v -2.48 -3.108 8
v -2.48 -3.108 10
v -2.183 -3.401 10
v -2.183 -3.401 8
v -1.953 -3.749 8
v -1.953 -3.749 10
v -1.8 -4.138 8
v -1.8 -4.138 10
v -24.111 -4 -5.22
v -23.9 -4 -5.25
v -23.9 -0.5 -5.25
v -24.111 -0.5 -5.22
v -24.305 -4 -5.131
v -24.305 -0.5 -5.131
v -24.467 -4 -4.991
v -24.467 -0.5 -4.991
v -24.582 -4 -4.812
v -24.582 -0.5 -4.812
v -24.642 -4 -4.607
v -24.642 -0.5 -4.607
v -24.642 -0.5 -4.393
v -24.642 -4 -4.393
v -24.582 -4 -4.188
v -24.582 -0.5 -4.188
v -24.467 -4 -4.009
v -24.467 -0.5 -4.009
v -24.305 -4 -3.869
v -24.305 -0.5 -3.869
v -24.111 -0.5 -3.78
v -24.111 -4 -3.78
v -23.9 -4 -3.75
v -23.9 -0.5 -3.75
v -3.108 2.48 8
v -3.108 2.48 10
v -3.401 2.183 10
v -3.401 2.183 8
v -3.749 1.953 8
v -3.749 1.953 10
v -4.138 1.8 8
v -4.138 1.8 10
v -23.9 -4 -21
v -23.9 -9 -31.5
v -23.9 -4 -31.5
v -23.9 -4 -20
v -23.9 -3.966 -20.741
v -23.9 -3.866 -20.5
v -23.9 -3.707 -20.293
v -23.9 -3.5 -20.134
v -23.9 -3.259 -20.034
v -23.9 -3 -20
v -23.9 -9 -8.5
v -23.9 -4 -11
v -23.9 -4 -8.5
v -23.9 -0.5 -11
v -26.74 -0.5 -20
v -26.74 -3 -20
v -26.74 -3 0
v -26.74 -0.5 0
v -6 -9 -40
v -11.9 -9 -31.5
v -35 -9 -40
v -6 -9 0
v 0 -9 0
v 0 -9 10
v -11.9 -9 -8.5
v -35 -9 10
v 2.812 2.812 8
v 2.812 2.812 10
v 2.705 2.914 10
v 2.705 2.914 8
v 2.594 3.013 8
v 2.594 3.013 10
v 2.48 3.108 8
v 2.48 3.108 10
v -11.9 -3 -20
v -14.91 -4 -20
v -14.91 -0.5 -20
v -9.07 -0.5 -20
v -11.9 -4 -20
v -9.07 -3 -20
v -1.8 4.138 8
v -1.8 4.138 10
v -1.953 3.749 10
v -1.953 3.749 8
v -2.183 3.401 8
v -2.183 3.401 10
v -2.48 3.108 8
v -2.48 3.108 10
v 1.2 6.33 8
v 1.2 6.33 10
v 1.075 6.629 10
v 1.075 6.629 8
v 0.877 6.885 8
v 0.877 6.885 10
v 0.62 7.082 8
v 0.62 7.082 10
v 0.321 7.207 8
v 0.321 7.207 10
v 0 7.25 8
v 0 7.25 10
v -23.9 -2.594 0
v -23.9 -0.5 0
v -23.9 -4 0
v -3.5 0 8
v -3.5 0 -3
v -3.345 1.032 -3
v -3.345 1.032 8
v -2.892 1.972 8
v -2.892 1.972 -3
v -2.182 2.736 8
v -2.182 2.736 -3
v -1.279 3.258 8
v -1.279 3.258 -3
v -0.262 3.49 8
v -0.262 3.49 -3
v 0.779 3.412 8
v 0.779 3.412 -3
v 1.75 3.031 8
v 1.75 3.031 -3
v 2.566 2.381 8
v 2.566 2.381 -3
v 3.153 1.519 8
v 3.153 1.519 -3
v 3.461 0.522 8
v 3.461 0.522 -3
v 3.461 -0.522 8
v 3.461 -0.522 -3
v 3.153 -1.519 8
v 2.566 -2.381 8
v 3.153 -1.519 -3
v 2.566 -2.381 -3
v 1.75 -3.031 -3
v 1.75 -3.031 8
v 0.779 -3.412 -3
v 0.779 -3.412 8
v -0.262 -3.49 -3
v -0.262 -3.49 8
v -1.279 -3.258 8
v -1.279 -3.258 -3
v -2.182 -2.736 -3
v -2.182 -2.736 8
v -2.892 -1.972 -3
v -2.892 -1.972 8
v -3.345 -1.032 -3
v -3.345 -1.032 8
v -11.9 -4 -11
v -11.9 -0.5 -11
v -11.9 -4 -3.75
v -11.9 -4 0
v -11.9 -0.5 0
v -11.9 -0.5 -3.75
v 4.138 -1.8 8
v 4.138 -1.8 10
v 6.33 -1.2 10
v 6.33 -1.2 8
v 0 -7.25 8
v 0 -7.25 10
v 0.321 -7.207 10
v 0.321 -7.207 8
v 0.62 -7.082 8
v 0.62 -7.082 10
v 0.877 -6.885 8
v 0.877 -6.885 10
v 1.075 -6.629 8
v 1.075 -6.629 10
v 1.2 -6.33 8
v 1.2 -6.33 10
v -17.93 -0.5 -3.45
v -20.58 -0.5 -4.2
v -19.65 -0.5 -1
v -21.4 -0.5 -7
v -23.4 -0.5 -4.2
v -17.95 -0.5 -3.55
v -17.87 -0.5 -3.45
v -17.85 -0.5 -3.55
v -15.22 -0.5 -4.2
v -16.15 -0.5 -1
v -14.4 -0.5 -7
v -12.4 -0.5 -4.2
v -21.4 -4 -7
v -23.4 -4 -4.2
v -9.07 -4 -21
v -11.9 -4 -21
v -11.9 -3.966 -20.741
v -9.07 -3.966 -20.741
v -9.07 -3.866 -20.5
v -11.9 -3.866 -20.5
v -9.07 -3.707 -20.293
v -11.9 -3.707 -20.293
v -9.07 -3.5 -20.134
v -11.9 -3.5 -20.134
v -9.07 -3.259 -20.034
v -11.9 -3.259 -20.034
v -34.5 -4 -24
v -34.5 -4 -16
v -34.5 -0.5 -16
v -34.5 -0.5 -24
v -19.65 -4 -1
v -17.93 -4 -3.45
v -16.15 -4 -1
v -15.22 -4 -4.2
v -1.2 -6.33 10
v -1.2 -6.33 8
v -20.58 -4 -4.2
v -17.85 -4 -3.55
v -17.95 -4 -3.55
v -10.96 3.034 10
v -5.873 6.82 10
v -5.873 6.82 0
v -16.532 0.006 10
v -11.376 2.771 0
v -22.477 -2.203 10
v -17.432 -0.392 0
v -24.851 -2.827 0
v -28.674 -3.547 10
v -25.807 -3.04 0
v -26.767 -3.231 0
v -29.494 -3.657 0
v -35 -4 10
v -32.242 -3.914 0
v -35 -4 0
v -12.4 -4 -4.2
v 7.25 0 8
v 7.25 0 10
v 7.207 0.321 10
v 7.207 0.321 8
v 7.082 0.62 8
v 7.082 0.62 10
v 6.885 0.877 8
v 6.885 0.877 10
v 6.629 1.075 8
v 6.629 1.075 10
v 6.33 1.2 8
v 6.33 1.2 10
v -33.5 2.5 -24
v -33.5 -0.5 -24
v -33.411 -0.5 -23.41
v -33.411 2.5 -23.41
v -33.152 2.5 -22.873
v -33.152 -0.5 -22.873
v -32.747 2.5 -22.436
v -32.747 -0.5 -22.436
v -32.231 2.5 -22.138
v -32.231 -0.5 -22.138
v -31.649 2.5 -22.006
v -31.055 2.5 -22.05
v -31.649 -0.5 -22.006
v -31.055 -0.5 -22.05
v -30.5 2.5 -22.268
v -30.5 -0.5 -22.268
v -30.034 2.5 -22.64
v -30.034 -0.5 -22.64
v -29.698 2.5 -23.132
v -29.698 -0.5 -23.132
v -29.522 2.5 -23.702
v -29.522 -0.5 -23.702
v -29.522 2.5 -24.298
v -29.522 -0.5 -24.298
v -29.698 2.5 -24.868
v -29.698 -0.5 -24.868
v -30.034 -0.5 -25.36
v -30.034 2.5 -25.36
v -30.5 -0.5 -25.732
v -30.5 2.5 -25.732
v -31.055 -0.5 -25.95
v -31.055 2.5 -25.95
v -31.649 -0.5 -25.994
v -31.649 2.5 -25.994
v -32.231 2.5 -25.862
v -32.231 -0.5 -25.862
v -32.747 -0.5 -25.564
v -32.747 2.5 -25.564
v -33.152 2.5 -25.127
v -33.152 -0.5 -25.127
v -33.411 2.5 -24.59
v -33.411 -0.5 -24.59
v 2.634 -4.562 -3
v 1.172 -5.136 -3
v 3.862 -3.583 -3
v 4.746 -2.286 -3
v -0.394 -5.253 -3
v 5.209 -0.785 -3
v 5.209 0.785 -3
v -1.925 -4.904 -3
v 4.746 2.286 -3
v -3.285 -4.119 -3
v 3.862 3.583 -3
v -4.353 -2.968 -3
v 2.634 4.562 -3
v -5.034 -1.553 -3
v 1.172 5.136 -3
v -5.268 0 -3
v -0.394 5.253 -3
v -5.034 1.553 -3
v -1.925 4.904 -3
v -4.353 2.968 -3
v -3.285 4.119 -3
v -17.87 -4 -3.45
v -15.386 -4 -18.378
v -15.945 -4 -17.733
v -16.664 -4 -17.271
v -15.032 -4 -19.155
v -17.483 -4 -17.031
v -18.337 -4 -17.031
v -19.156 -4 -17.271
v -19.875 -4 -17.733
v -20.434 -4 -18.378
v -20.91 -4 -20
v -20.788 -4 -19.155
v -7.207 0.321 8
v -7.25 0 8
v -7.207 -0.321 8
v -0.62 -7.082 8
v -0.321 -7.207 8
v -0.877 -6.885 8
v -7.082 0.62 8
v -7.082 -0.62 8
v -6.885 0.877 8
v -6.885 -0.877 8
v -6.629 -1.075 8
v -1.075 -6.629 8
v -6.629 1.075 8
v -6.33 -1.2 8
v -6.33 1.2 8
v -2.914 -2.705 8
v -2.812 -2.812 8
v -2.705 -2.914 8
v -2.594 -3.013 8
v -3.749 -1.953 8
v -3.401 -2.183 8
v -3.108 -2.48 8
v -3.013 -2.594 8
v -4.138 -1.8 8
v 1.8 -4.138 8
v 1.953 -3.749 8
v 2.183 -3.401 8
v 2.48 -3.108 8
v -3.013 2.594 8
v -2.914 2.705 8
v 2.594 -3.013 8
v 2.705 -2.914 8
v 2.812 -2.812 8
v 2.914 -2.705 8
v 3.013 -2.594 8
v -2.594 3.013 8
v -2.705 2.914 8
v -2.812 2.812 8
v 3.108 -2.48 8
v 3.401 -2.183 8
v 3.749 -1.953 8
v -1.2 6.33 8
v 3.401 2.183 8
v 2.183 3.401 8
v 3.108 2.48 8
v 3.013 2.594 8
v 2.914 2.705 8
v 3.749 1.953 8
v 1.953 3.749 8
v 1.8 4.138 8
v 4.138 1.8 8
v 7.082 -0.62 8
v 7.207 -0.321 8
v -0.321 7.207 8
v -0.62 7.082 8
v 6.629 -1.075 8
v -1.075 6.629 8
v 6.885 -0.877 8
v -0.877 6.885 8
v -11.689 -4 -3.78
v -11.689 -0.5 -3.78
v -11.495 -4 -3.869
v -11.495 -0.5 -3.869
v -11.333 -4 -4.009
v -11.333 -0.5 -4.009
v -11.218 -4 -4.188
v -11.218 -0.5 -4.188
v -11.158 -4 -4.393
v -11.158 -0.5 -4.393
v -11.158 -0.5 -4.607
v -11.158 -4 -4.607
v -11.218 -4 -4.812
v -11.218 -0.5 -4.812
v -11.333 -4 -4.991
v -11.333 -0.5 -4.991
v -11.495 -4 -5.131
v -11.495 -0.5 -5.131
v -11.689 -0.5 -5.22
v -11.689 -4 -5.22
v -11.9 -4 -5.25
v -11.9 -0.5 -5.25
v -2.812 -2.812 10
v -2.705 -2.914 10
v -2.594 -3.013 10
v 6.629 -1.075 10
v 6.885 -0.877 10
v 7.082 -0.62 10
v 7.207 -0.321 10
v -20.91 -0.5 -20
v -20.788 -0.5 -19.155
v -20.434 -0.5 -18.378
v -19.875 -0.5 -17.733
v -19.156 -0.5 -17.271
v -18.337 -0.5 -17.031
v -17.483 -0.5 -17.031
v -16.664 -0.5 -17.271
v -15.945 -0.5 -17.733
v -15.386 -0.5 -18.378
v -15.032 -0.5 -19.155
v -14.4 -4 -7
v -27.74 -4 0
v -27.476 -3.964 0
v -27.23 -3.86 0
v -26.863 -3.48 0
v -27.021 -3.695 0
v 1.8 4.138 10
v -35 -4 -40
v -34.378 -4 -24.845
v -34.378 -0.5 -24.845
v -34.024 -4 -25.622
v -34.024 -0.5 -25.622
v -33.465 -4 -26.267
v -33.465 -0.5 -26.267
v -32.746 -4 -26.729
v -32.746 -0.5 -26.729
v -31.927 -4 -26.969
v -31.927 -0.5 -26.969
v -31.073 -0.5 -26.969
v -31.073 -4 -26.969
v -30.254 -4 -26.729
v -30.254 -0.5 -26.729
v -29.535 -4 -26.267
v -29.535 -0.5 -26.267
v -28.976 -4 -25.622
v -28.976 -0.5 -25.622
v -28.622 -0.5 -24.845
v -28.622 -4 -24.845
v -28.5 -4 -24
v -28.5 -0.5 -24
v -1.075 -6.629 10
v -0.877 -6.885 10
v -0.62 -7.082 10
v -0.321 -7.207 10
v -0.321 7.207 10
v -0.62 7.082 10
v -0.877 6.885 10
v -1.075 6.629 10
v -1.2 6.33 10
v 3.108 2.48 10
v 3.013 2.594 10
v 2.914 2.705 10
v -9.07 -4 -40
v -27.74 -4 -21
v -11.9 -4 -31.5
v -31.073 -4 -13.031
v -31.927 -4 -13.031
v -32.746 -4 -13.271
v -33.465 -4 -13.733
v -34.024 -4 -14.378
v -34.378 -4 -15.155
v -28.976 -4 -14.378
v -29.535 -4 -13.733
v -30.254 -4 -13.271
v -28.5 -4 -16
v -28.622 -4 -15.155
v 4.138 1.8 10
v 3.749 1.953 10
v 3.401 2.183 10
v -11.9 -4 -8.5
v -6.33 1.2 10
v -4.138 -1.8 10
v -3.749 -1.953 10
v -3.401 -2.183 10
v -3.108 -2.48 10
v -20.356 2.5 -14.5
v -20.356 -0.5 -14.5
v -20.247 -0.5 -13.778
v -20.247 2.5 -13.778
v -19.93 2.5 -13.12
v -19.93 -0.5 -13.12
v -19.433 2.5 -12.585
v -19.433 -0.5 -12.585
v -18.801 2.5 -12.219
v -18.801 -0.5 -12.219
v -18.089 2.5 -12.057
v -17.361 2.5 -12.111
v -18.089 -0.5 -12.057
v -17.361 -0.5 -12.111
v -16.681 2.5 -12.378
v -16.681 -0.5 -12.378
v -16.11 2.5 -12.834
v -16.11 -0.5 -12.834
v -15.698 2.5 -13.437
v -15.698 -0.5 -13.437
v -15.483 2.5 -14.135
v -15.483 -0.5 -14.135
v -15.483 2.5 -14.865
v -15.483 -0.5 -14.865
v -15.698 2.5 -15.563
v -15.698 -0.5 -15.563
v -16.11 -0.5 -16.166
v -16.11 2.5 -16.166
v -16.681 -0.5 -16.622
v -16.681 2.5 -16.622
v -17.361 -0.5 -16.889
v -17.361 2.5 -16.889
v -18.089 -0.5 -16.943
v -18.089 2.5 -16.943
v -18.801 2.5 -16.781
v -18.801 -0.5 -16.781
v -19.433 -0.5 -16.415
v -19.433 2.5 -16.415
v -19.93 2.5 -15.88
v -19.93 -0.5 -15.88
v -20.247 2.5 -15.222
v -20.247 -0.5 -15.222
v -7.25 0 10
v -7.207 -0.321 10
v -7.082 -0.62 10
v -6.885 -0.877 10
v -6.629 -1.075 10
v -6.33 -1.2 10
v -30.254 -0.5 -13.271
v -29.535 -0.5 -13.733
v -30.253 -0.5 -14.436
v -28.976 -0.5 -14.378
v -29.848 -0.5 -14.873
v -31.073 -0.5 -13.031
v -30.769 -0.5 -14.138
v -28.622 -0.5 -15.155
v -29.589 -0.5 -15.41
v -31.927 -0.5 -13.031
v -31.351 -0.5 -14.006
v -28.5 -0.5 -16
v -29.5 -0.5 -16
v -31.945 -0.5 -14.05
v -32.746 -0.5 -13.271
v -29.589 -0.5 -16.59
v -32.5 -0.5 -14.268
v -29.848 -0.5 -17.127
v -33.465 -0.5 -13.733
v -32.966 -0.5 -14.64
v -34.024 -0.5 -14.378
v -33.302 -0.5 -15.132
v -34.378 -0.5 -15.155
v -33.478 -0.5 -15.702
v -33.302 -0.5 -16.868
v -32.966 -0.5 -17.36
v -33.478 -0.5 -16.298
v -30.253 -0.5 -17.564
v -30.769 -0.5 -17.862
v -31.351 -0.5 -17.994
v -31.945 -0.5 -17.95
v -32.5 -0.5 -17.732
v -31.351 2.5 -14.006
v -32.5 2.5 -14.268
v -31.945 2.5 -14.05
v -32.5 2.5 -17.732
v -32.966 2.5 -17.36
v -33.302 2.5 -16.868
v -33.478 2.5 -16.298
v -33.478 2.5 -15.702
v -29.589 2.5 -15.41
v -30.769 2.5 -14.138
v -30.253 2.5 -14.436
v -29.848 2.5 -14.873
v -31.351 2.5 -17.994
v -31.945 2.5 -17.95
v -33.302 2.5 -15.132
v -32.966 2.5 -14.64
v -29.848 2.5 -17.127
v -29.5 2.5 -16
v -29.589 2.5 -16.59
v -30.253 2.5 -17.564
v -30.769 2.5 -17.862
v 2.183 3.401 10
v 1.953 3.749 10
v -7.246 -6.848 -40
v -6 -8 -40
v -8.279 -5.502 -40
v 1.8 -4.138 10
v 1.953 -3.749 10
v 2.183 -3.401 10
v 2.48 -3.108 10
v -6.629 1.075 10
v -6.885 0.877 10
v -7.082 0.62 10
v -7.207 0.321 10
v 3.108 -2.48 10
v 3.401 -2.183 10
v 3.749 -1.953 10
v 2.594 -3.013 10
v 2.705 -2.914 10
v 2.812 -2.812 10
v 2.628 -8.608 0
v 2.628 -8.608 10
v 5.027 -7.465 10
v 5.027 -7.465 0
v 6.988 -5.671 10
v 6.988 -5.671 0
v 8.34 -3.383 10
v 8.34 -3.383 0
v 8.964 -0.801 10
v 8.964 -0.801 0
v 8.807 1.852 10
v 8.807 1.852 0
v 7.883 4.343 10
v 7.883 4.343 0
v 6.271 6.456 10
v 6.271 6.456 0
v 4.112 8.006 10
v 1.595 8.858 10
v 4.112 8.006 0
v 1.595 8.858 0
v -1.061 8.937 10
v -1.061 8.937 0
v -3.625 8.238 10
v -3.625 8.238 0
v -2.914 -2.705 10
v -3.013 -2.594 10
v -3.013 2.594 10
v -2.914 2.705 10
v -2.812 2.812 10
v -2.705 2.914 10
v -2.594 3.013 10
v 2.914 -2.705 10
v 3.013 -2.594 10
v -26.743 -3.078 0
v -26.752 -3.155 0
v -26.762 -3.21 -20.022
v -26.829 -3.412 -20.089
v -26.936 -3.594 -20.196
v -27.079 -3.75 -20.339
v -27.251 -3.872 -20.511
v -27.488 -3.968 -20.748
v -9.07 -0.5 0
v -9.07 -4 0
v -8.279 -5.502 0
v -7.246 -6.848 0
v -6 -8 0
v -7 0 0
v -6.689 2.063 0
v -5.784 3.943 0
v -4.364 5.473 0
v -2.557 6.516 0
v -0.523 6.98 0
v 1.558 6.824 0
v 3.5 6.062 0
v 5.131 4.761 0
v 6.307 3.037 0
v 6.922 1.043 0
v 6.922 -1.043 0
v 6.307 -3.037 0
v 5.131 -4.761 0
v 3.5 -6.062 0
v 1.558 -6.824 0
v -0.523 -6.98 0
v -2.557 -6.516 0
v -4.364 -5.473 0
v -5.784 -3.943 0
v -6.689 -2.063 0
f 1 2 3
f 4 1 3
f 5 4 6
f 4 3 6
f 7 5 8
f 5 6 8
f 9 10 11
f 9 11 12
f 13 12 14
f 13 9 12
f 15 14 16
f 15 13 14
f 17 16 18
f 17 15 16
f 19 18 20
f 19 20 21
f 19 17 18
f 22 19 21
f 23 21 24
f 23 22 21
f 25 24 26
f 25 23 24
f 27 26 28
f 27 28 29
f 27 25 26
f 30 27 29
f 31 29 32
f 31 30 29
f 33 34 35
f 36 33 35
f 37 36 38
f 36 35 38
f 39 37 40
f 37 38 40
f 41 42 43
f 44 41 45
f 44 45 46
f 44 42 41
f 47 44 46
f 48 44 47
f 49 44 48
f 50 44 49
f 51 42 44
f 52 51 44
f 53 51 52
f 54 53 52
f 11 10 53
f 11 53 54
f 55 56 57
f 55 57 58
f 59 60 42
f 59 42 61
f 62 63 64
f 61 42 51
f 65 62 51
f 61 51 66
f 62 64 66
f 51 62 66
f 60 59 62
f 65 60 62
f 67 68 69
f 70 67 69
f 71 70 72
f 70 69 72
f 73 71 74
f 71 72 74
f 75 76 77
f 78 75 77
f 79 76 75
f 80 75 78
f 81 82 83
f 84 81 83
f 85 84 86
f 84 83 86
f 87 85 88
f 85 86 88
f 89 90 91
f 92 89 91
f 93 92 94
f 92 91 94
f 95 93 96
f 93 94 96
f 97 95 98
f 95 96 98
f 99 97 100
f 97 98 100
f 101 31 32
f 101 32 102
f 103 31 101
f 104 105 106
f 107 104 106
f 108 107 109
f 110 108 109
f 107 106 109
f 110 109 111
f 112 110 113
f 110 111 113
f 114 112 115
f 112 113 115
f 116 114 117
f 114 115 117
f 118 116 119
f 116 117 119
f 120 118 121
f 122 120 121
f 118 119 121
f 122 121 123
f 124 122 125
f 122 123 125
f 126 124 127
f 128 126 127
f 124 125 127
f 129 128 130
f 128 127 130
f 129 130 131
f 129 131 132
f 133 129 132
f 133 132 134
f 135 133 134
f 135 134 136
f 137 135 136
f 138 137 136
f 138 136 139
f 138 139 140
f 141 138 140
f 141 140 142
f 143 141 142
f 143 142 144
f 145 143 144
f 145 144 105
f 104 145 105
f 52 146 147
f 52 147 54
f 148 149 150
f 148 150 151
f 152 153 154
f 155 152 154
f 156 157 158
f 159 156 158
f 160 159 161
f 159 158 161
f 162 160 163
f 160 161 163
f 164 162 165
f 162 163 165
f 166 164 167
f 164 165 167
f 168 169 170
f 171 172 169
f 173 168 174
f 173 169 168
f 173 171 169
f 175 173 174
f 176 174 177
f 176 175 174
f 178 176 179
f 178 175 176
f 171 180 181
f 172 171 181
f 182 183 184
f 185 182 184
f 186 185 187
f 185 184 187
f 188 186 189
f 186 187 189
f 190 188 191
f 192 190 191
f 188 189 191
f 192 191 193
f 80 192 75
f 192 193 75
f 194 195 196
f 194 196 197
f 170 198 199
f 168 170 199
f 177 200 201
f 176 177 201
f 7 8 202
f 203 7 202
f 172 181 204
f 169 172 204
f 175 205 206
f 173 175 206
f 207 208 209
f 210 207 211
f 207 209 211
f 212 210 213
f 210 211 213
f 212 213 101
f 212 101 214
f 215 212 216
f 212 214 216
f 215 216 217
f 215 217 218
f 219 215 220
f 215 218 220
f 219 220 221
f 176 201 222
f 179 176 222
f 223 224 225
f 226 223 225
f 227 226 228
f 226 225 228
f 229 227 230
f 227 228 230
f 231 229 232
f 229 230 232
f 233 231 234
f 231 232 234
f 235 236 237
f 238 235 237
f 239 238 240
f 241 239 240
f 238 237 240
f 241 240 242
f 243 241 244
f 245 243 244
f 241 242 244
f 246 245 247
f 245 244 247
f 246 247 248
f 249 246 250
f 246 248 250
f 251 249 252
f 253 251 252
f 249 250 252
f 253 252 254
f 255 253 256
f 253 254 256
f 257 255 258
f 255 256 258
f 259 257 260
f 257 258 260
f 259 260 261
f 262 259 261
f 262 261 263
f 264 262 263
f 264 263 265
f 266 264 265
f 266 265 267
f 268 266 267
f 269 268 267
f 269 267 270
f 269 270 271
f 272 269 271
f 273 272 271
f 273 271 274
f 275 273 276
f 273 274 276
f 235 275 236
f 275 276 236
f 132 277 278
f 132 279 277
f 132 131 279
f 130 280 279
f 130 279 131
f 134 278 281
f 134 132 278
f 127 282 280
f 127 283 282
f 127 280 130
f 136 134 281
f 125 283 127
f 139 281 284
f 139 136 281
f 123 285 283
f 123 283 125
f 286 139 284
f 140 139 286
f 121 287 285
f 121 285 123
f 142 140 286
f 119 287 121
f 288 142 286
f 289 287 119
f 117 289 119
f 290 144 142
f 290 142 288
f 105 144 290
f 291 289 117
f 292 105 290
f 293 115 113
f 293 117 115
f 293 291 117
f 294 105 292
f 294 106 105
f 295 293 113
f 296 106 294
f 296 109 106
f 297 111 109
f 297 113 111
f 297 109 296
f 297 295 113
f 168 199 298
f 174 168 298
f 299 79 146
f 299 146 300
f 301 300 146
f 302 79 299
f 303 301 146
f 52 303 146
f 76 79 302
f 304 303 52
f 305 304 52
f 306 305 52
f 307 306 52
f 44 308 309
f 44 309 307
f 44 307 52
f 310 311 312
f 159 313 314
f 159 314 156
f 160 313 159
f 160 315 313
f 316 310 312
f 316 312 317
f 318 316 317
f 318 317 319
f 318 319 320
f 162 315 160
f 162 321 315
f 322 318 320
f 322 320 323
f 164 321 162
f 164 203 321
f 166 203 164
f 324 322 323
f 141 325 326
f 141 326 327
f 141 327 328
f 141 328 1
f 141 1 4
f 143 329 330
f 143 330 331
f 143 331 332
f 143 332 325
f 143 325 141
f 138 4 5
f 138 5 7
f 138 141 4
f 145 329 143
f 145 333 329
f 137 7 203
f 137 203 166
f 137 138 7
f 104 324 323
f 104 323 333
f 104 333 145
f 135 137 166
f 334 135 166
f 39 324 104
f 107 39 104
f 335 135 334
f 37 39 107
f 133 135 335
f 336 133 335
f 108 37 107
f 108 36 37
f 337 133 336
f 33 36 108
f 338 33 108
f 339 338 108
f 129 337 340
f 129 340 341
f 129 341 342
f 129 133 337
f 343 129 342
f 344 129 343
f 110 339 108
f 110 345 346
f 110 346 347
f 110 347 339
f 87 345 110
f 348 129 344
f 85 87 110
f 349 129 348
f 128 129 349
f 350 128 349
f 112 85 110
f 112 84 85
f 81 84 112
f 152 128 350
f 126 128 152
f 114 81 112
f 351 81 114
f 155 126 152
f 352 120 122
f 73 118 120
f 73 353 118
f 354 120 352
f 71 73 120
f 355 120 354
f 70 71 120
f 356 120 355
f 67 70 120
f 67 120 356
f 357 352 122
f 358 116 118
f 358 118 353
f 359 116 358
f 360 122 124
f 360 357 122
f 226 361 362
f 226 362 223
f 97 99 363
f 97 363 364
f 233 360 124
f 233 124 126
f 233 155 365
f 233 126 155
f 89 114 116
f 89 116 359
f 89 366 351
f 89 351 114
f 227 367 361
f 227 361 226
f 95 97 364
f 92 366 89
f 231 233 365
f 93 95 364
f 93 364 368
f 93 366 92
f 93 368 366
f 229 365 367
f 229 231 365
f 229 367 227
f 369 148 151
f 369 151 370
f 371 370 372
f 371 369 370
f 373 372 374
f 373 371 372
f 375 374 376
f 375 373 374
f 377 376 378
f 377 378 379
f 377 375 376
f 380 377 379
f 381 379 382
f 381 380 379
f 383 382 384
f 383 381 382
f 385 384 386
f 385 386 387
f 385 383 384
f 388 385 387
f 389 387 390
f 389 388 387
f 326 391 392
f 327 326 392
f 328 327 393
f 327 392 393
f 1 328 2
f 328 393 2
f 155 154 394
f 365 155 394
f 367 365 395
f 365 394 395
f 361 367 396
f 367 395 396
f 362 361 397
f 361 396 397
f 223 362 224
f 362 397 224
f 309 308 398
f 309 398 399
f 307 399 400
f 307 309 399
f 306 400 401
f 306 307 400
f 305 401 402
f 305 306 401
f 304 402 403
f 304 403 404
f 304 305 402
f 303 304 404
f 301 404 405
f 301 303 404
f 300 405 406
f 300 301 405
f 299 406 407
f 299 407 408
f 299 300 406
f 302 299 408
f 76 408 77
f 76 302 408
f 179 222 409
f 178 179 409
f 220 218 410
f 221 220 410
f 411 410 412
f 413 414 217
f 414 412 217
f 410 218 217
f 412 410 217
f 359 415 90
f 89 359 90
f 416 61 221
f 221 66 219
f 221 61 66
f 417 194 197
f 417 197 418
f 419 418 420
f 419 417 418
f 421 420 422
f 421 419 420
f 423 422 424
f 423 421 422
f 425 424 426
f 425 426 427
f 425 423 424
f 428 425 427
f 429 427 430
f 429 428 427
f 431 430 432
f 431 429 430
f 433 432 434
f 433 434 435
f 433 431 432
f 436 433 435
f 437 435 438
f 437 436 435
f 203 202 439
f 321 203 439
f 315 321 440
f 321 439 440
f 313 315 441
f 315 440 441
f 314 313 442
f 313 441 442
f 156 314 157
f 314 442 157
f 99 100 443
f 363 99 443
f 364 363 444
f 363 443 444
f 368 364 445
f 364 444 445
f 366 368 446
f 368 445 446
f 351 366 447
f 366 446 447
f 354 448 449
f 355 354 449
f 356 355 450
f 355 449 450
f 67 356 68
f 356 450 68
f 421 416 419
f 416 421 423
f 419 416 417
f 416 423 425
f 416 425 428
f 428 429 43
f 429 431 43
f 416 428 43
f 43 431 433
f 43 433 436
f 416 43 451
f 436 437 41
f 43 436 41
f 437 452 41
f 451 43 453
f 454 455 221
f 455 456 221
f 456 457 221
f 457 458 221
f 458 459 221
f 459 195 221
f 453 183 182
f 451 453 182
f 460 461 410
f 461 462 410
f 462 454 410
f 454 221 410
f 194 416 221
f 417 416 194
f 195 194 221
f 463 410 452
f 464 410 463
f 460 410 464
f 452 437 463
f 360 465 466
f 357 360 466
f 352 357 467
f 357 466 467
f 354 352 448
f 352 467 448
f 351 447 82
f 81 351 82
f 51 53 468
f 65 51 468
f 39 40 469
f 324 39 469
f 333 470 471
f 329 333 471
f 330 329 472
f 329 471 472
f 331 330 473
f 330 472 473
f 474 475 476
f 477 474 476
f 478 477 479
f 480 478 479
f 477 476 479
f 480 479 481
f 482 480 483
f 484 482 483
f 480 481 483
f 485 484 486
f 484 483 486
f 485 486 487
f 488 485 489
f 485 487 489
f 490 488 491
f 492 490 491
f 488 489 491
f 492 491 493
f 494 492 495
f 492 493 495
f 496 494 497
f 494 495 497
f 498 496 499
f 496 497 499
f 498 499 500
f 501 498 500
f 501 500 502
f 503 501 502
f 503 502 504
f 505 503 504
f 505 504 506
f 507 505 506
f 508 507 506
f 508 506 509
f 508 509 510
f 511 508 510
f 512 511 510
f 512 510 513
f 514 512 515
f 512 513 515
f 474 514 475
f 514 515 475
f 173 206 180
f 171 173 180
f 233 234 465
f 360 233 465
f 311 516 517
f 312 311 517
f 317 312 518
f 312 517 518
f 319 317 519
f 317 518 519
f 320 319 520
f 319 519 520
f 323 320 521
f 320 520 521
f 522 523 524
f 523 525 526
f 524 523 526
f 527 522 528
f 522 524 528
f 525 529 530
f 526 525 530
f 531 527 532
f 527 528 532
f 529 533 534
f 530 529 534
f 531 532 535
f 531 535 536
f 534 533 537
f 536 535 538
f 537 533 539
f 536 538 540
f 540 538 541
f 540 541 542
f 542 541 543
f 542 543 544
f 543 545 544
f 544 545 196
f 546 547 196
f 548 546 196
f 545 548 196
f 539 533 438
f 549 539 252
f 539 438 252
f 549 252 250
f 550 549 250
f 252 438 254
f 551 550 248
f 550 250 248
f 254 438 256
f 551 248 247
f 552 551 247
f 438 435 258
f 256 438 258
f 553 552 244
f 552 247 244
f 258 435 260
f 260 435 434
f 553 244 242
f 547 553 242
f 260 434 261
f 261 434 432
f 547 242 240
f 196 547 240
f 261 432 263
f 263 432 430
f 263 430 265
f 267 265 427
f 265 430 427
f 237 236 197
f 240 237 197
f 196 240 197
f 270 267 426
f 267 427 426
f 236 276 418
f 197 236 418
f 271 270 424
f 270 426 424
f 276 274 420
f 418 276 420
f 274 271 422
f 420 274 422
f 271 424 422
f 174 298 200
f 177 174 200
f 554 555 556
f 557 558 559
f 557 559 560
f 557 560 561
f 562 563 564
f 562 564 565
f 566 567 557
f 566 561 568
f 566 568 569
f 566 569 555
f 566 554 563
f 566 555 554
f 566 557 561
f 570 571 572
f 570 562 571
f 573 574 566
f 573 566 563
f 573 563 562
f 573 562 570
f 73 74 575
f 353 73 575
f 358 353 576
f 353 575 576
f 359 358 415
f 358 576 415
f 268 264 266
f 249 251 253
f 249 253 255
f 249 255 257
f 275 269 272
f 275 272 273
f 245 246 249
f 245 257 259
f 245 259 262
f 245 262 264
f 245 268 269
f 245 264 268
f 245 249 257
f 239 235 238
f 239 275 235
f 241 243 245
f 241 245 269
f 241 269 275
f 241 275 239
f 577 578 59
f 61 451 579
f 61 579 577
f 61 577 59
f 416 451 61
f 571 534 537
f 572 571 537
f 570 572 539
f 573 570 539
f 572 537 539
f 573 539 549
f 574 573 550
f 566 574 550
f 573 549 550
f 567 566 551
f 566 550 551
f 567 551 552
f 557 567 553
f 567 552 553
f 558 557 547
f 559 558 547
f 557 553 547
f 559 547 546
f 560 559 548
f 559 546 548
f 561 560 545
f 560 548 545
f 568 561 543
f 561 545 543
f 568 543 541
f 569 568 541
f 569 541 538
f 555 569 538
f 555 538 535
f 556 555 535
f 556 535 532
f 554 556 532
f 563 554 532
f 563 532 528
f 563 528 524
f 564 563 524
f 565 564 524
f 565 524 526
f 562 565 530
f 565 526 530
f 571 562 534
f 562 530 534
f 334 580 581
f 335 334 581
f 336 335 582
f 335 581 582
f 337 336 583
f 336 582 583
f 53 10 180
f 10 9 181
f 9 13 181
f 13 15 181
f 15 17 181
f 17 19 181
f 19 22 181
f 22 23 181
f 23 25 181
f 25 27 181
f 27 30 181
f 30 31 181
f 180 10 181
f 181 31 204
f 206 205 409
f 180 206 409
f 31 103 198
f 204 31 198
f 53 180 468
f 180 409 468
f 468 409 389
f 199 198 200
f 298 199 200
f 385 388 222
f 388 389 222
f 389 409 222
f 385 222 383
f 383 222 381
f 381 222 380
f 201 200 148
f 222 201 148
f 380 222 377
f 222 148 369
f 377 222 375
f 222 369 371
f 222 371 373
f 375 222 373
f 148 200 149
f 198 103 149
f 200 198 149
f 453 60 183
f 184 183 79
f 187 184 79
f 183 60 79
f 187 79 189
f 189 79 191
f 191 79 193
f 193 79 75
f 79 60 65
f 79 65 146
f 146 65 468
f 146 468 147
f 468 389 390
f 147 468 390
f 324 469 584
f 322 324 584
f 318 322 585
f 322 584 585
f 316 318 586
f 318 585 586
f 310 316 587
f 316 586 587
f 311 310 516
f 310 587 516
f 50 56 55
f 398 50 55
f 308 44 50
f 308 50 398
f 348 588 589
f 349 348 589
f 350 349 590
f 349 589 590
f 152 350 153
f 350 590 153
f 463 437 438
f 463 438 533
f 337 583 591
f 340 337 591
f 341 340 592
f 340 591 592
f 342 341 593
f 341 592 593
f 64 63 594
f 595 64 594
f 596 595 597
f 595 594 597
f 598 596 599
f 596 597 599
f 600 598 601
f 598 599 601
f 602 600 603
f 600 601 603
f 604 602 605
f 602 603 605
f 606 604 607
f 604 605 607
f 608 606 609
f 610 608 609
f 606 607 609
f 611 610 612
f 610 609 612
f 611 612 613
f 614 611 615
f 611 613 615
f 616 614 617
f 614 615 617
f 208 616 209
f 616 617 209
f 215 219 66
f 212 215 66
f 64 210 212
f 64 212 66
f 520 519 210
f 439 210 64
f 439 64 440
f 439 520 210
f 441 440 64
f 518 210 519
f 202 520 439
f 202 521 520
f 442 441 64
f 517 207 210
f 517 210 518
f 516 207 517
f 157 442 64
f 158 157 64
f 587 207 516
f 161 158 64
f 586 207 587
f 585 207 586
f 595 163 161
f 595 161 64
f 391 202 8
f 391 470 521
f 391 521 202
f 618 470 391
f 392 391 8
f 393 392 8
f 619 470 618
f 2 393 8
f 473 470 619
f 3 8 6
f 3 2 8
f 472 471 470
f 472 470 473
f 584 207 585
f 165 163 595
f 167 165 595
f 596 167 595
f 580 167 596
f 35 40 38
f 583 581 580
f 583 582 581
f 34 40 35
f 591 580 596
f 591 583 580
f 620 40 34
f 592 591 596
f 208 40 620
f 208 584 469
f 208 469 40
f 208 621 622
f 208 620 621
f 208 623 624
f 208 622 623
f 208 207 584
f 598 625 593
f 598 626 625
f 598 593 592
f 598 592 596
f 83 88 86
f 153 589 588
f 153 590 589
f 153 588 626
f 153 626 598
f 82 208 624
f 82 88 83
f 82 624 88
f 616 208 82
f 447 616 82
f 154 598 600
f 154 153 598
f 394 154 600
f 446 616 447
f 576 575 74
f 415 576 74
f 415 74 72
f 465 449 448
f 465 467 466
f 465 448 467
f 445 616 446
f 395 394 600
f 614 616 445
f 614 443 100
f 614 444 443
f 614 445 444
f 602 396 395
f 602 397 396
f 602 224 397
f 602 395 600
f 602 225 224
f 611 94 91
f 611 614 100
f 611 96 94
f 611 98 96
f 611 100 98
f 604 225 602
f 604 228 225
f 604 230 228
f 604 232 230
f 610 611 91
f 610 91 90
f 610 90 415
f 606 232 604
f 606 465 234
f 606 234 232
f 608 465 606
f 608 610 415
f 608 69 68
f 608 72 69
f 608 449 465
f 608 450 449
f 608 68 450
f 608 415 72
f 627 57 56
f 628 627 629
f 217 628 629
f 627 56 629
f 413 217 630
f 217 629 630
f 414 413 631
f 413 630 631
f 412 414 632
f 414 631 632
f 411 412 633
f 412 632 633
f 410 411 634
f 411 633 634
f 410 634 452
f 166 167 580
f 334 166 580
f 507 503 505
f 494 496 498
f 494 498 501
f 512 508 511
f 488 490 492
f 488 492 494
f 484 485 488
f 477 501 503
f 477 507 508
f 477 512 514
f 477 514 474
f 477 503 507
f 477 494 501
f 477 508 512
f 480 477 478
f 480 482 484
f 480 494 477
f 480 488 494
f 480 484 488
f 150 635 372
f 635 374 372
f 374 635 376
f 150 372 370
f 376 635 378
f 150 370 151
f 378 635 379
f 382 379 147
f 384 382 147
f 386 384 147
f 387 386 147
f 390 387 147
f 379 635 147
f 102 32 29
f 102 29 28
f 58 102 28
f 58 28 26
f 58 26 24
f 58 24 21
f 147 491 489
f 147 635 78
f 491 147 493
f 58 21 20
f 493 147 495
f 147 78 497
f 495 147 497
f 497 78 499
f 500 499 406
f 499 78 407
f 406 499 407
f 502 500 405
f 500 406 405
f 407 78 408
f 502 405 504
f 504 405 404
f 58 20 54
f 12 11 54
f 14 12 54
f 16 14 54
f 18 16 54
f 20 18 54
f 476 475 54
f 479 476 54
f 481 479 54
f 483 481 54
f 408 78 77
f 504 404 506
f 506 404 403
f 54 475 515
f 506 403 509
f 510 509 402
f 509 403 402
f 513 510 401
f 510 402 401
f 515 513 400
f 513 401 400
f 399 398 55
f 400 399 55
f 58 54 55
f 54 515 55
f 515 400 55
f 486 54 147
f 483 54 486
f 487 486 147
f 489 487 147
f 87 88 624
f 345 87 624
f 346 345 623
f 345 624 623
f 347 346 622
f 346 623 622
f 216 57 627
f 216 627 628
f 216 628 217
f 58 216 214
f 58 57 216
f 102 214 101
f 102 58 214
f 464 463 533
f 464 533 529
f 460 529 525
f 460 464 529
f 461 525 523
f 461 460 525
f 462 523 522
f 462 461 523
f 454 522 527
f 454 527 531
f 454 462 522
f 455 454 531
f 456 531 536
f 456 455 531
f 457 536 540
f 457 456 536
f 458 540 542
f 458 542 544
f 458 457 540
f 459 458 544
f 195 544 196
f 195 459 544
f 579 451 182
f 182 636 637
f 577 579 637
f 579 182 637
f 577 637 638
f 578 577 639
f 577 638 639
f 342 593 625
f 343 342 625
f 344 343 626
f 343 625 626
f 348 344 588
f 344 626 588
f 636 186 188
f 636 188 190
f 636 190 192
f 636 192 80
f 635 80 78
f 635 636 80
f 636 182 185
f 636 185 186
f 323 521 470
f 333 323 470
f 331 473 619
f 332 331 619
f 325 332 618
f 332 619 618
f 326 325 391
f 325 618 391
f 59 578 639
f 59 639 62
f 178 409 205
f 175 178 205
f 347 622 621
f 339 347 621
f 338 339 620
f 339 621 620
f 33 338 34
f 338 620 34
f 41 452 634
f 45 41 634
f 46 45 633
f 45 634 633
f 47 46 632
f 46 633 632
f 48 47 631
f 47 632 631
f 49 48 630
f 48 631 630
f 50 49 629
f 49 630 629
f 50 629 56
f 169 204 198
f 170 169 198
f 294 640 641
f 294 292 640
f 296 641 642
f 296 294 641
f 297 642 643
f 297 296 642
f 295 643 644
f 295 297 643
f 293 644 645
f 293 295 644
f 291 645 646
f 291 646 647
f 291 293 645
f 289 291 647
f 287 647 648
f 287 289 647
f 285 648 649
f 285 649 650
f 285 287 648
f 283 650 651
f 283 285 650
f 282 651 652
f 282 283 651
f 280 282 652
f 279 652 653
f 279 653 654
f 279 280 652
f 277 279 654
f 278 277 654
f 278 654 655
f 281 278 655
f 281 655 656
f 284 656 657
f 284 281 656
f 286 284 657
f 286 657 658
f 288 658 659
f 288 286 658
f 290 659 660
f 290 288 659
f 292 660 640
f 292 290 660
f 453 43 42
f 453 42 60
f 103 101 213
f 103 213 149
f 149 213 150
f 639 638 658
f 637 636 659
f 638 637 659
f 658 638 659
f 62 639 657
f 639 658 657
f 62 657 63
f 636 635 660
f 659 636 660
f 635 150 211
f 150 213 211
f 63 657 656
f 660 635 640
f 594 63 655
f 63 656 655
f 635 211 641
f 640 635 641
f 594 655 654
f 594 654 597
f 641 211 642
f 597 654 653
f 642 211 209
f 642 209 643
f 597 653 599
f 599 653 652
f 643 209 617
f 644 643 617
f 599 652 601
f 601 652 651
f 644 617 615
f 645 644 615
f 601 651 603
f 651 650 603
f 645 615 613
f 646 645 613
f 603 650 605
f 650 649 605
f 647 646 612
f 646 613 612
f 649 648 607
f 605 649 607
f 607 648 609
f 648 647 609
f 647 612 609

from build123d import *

# Parameters (mm, degrees)
SKETCH2_R           = 9
BOSS_EXTRUDE1_DEPTH = 10
SKETCH3_R           = 7
BOSS_EXTRUDE2_DEPTH = 3
BOSS_EXTRUDE2_TAPER = 30
CUT_EXTRUDE1_DEPTH  = 2
BOSS_EXTRUDE3_DEPTH = 40
SKETCH6_W           = 12
SKETCH6_H           = 23
CUT_EXTRUDE3_DEPTH  = 55.717456081
BOSS_EXTRUDE4_DEPTH = 3.5
SKETCH8_R           = 2
BOSS_EXTRUDE5_DEPTH = 3
SKETCH9_R           = 3.5
CUT_EXTRUDE4_DEPTH  = 52.720402164
BOSS_EXTRUDE6_DEPTH = 3.5
SKETCH11_R          = 2.45
BOSS_EXTRUDE7_DEPTH = 3
BOSS_EXTRUDE9_DEPTH = 3.5
FILLET1_START       = -26.74
FILLET1_DEPTH       = 2.84
FILLET1_START_2     = -11.9
FILLET1_2_DEPTH     = 2.83
FILLET1_START_3     = -21
FILLET1_3_DEPTH     = 21
FILLET1_START_4     = -27.74
FILLET1_4_DEPTH     = 1


with BuildPart() as part:
    # Sketch2 → Boss-Extrude1 (new body)
    with BuildSketch(Plane.XY):
        with BuildLine():
            Line((-35, -9), (0, -9))
            ThreePointArc((0, -9), (-8.437416666, -3.132091953), (-5.872614409, 6.82))
            ThreePointArc((-5.872614409, 6.82), (-19.465199243, -1.204217751), (-35, -4))
            Line((-35, -4), (-35, -9))
        make_face()
        Circle(SKETCH2_R)
    extrude(amount=BOSS_EXTRUDE1_DEPTH)

    # Sketch3 → Boss-Extrude2 (add)
    with BuildSketch(Plane(origin=(0, 0, 0), x_dir=(-1, 0, 0), z_dir=(0, 0, -1))):
        Circle(SKETCH3_R)
    extrude(amount=BOSS_EXTRUDE2_DEPTH, taper=BOSS_EXTRUDE2_TAPER)

    # Sketch4 → Cut-Extrude1 (cut)
    with BuildSketch(Plane.XY.offset(10)):
        with BuildLine():
            Line((1.2, -6.33), (1.8, -4.1378116))
            ThreePointArc((1.8, -4.1378116), (2.058560194, -3.569045514), (2.48, -3.1078116))
            ThreePointArc((2.48, -3.1078116), (2.64989874, -2.964295475), (2.811558399, -2.811558399))
            ThreePointArc((2.811558399, -2.811558399), (2.964295475, -2.64989874), (3.1078116, -2.48))
            ThreePointArc((3.1078116, -2.48), (3.569045514, -2.058560194), (4.1378116, -1.8))
            Line((4.1378116, -1.8), (6.33, -1.2))
            ThreePointArc((6.33, -1.2), (6.992020752, -0.754882576), (7.25, 0))
            ThreePointArc((7.25, 0), (6.992020752, 0.754882576), (6.33, 1.2))
            Line((6.33, 1.2), (4.1378116, 1.8))
            ThreePointArc((4.1378116, 1.8), (3.569045514, 2.058560194), (3.1078116, 2.48))
            ThreePointArc((3.1078116, 2.48), (2.964295475, 2.64989874), (2.811558399, 2.811558399))
            ThreePointArc((2.811558399, 2.811558399), (2.64989874, 2.964295475), (2.48, 3.1078116))
            ThreePointArc((2.48, 3.1078116), (2.058560194, 3.569045514), (1.8, 4.1378116))
            Line((1.8, 4.1378116), (1.2, 6.33))
            ThreePointArc((1.2, 6.33), (0.754882576, 6.992020752), (0, 7.25))
            ThreePointArc((0, 7.25), (-0.754882576, 6.992020752), (-1.2, 6.33))
            Line((-1.2, 6.33), (-1.8, 4.1378116))
            ThreePointArc((-1.8, 4.1378116), (-2.058560194, 3.569045514), (-2.48, 3.1078116))
            ThreePointArc((-2.48, 3.1078116), (-2.64989874, 2.964295475), (-2.811558399, 2.811558399))
            ThreePointArc((-2.811558399, 2.811558399), (-2.964295475, 2.64989874), (-3.1078116, 2.48))
            ThreePointArc((-3.1078116, 2.48), (-3.569045514, 2.058560194), (-4.1378116, 1.8))
            Line((-4.1378116, 1.8), (-6.33, 1.2))
            ThreePointArc((-6.33, 1.2), (-6.992020752, 0.754882576), (-7.25, 0))
            ThreePointArc((-7.25, 0), (-6.992020752, -0.754882576), (-6.33, -1.2))
            Line((-6.33, -1.2), (-4.1378116, -1.8))
            ThreePointArc((-4.1378116, -1.8), (-3.569045514, -2.058560194), (-3.1078116, -2.48))
            ThreePointArc((-3.1078116, -2.48), (-2.964295475, -2.64989874), (-2.811558399, -2.811558399))
            ThreePointArc((-2.811558399, -2.811558399), (-2.64989874, -2.964295475), (-2.48, -3.1078116))
            ThreePointArc((-2.48, -3.1078116), (-2.058560194, -3.569045514), (-1.8, -4.1378116))
            Line((-1.8, -4.1378116), (-1.2, -6.33))
            ThreePointArc((-1.2, -6.33), (-0.754882576, -6.992020752), (0, -7.25))
            ThreePointArc((0, -7.25), (0.754882576, -6.992020752), (1.2, -6.33))
        make_face()
    extrude(amount=-CUT_EXTRUDE1_DEPTH, mode=Mode.SUBTRACT)

    # Sketch5 → Boss-Extrude3 (add)
    with BuildSketch(Plane(origin=(0, 0, 0), x_dir=(-1, 0, 0), z_dir=(0, 0, -1))):
        with BuildLine():
            Line((35, -9), (35, -4))
            Line((35, -4), (9.07, -4))
            ThreePointArc((9.07, -4), (7.791254425, -6.196675271), (6, -8))
            Line((6, -8), (6, -9))
            Line((6, -9), (35, -9))
        make_face()
    extrude(amount=BOSS_EXTRUDE3_DEPTH)

    # Sketch6 → Cut-Extrude3 (cut, through all)
    with BuildSketch(Plane(origin=(0, -4, 0), x_dir=(1, 0, 0), z_dir=(0, 1, 0))):
        with Locations((-17.9, 20)):
            Rectangle(SKETCH6_W, SKETCH6_H)
    extrude(amount=-CUT_EXTRUDE3_DEPTH, mode=Mode.SUBTRACT)

    # Sketch7 → Boss-Extrude4 (add)
    with BuildSketch(Plane(origin=(0, -4, 0), x_dir=(1, 0, 0), z_dir=(0, 1, 0))):
        with BuildLine():
            Line((-34.5, 16), (-34.5, 24))
            ThreePointArc((-34.5, 24), (-31.5, 27), (-28.5, 24))
            Line((-28.5, 24), (-28.5, 16))
            ThreePointArc((-28.5, 16), (-31.5, 13), (-34.5, 16))
        make_face()
    extrude(amount=BOSS_EXTRUDE4_DEPTH)

    # Sketch8 → Boss-Extrude5 (add)
    with BuildSketch(Plane(origin=(0, -0.5, 0), x_dir=(1, 0, 0), z_dir=(0, 1, 0))):
        with Locations(Location((-31.5, 24, 0), (0, 0, 180))):
            Circle(SKETCH8_R)
        with Locations((-31.5, 16)):
            Circle(SKETCH8_R)
    extrude(amount=BOSS_EXTRUDE5_DEPTH)

    # Sketch9 → Cut-Extrude4 (cut, through all)
    with BuildSketch(Plane(origin=(0, 0, -3), x_dir=(-1, 0, 0), z_dir=(0, 0, -1))):
        Circle(SKETCH9_R)
    extrude(amount=-CUT_EXTRUDE4_DEPTH, mode=Mode.SUBTRACT)

    # Sketch10 → Boss-Extrude6 (add)
    with BuildSketch(Plane(origin=(0, -4, 0), x_dir=(1, 0, 0), z_dir=(0, 1, 0))):
        with BuildLine():
            Line((-26.74, 0), (-26.74, 20))
            Line((-26.74, 20), (-20.91, 20))
            ThreePointArc((-20.91, 20), (-17.91, 17), (-14.91, 20))
            Line((-14.91, 20), (-9.07, 20))
            Line((-9.07, 20), (-9.07, 0))
            Line((-9.07, 0), (-11.9, 0))
            Line((-11.9, 0), (-11.9, 3.75))
            ThreePointArc((-11.9, 3.75), (-11.15, 4.5), (-11.9, 5.25))
            Line((-11.9, 5.25), (-11.9, 11))
            Line((-11.9, 11), (-23.9, 11))
            Line((-23.9, 11), (-23.9, 5.25))
            ThreePointArc((-23.9, 5.25), (-24.65, 4.5), (-23.9, 3.75))
            Line((-23.9, 3.75), (-23.9, 0))
            Line((-23.9, 0), (-26.74, 0))
        make_face()
    extrude(amount=BOSS_EXTRUDE6_DEPTH)

    # Sketch11 → Boss-Extrude7 (add)
    with BuildSketch(Plane(origin=(0, -0.5, 0), x_dir=(1, 0, 0), z_dir=(0, 1, 0))):
        with Locations(Location((-17.905833333, 14.5, 0), (0, 0, 180))):
            Circle(SKETCH11_R)
    extrude(amount=BOSS_EXTRUDE7_DEPTH)

    # Sketch12 → Boss-Extrude9 (add)
    with BuildSketch(Plane(origin=(0, -4, 0), x_dir=(1, 0, 0), z_dir=(0, 1, 0))):
        Polygon((-20.58, 4.2), (-19.65, 1), (-17.93, 3.45), (-17.87, 3.45), (-16.15, 1), (-15.22, 4.2), (-12.4, 4.2), (-14.4, 7), (-17.85, 3.55), (-17.95, 3.55), (-21.4, 7), (-23.4, 4.2), align=None)
    extrude(amount=BOSS_EXTRUDE9_DEPTH)

    # Fillet1: read off the stored shape, not the designer's step
    # Fillet1 outline → Fillet1 (add)
    with BuildSketch(Plane.YZ.offset(FILLET1_START)):
        with BuildLine():
            ThreePointArc((-4, -21), (-3.707106781, -20.292893219), (-3, -20))
            Line((-3, -20), (-4, -20))
            Line((-4, -20), (-4, -21))
        make_face()
    extrude(amount=FILLET1_DEPTH)

    # Fillet1 2 outline → Fillet1 2 (add)
    with BuildSketch(Plane.YZ.offset(FILLET1_START_2)):
        with BuildLine():
            ThreePointArc((-4, -21), (-3.707106781, -20.292893219), (-3, -20))
            Line((-3, -20), (-4, -20))
            Line((-4, -20), (-4, -21))
        make_face()
    extrude(amount=FILLET1_2_DEPTH)

    # Fillet1 3 outline → Fillet1 3 (add)
    with BuildSketch(Plane.XY.offset(FILLET1_START_3)):
        with BuildLine():
            Line((-26.74, -4), (-26.74, -3))
            ThreePointArc((-26.74, -3), (-27.032893219, -3.707106781), (-27.74, -4))
            Line((-27.74, -4), (-26.74, -4))
        make_face()
    extrude(amount=FILLET1_3_DEPTH)

    # Fillet1 4 outline → Fillet1 4 (cut)
    with BuildSketch(Plane.YZ.offset(FILLET1_START_4)):
        with BuildLine():
            Line((-2, -19.999999999), (-3, -20))
            ThreePointArc((-3, -20), (-3.707106781, -20.292893219), (-4, -21))
            Line((-4, -21), (-2, -21))
            Line((-2, -21), (-2, -19.999999999))
        make_face()
    extrude(amount=FILLET1_4_DEPTH, mode=Mode.SUBTRACT)


solid = part.part
